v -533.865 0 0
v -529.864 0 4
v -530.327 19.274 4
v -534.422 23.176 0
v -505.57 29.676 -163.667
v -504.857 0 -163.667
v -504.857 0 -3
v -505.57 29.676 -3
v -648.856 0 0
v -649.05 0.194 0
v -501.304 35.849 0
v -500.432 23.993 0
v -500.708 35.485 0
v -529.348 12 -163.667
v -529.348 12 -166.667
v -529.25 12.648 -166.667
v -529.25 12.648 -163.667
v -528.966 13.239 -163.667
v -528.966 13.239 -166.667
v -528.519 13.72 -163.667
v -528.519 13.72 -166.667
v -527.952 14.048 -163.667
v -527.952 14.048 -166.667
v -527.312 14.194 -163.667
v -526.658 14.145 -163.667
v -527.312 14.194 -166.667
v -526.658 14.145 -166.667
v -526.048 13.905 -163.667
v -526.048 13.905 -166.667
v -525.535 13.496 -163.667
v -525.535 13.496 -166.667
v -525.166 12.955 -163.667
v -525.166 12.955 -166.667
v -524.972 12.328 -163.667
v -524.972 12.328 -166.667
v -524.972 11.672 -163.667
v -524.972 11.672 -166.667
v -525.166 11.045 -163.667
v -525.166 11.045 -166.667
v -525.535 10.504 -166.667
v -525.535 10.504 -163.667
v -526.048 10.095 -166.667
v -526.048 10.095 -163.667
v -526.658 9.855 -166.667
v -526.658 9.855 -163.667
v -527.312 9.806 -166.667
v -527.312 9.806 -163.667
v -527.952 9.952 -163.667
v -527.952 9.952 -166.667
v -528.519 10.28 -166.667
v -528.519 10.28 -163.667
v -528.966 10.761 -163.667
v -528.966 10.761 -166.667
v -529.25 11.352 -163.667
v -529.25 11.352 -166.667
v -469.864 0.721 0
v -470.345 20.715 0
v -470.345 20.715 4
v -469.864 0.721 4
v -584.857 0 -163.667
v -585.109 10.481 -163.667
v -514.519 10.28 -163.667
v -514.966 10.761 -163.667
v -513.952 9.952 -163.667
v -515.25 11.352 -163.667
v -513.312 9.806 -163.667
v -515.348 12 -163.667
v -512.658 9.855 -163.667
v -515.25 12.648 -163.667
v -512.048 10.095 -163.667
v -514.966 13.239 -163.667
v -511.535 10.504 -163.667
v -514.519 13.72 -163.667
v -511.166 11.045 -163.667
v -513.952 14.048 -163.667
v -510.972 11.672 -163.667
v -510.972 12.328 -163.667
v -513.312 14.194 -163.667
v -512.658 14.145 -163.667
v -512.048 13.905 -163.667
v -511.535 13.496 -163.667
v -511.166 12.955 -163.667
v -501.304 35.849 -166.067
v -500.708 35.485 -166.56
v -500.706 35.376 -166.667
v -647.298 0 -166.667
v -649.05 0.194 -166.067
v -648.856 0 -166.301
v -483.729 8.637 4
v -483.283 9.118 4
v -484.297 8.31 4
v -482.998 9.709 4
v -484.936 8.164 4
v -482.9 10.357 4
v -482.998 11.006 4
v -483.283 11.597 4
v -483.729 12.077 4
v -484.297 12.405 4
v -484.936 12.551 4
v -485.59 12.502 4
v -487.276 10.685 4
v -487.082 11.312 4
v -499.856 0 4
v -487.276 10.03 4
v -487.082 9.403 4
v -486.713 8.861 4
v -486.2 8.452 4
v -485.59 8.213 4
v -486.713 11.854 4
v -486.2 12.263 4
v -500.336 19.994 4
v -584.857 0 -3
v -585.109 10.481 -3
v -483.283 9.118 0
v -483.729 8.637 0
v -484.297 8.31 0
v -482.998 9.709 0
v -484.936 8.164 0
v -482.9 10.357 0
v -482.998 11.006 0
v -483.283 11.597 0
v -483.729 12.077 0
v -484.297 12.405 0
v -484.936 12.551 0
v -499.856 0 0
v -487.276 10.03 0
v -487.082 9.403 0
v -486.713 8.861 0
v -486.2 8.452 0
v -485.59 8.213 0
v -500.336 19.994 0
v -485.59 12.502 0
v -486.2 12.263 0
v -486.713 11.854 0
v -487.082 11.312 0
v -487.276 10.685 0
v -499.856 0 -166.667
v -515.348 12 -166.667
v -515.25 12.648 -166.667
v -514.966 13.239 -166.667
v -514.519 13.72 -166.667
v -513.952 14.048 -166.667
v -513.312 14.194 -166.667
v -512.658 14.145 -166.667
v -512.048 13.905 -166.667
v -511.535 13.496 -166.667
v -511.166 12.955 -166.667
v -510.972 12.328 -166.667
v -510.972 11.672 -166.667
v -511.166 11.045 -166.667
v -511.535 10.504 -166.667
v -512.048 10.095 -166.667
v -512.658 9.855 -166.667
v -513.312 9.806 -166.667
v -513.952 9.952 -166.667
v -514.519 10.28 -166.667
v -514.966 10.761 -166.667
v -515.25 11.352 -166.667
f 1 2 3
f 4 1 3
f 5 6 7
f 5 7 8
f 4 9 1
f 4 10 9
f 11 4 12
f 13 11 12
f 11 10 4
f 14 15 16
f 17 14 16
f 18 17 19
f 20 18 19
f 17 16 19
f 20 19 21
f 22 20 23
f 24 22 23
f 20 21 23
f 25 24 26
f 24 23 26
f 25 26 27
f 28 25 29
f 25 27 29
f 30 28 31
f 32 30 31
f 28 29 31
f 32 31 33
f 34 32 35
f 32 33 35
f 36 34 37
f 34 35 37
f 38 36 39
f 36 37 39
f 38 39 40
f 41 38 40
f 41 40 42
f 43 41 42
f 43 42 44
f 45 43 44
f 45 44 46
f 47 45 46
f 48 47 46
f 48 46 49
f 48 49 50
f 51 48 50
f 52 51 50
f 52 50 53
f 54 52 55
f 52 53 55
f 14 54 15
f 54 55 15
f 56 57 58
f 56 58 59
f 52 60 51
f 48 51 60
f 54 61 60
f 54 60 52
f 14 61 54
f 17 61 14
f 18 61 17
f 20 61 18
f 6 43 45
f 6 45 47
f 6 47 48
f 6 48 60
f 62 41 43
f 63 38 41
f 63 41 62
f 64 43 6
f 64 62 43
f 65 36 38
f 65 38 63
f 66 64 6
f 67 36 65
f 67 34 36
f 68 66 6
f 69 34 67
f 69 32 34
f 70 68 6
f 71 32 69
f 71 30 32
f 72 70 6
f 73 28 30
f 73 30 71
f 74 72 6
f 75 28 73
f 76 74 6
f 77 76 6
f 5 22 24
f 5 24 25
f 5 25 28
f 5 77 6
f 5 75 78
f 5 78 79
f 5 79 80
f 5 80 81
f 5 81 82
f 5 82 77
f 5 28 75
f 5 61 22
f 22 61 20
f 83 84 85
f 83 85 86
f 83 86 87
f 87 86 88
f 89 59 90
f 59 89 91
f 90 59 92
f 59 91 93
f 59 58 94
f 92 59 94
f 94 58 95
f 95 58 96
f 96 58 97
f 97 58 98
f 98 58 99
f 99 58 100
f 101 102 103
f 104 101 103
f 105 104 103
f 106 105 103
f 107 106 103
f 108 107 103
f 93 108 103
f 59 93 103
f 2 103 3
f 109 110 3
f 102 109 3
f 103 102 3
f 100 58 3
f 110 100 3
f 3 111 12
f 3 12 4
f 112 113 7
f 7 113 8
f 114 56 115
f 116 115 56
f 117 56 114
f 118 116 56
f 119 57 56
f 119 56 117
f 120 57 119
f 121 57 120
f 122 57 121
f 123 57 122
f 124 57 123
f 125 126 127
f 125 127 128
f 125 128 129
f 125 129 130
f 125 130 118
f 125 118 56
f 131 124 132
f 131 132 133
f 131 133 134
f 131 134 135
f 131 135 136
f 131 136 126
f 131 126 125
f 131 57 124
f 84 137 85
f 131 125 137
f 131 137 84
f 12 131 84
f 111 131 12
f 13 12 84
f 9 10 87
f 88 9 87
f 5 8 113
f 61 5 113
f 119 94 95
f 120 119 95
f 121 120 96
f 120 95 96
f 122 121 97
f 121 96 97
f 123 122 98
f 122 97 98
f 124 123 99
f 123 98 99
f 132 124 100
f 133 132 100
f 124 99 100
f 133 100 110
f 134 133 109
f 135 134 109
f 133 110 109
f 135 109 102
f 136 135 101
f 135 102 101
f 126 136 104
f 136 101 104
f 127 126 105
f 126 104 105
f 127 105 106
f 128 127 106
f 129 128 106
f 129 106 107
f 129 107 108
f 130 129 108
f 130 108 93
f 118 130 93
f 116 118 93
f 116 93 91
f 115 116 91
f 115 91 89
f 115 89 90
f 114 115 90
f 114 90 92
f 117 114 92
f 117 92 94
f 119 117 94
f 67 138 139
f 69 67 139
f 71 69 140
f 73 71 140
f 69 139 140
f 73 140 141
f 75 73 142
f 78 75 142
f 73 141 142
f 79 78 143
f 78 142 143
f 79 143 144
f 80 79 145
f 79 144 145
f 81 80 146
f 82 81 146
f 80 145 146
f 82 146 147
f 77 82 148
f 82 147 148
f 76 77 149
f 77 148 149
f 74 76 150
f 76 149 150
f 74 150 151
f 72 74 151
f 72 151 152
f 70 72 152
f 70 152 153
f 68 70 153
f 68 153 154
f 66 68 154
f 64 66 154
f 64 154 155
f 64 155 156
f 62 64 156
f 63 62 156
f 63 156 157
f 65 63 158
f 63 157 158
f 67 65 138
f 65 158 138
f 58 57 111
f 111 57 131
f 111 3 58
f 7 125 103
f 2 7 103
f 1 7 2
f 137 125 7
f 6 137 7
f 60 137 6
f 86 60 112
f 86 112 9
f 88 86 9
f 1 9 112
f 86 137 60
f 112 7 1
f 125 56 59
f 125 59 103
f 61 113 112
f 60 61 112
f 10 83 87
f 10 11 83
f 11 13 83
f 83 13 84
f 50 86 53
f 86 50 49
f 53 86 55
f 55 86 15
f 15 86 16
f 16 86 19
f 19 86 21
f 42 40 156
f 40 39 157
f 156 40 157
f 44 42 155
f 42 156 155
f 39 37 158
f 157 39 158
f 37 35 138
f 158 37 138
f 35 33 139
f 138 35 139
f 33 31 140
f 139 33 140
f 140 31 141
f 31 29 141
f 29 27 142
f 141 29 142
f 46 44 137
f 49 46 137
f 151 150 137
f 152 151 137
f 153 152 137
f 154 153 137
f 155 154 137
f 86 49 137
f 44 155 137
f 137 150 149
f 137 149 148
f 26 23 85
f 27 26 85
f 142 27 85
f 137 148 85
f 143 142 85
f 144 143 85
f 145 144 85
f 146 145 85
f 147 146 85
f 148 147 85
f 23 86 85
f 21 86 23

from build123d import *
from OCP.BRepFilletAPI import BRepFilletAPI_MakeChamfer

# Parameters (mm, degrees)
BOSS_EXTRUDE1_DEPTH = 166.66666666666666
CUT_EXTRUDE1_DEPTH  = 160.666666667
BOSS_EXTRUDE2_DEPTH = 4
SKETCH9_R           = 2.1999999999999833
CUT_EXTRUDE3_DEPTH  = 673.8557295952264
SKETCH10_R          = 2.1999999999999833
CUT_EXTRUDE4_DEPTH  = 3
CHAMFER3_SIZE       = 0.6
CHAMFER3_SIZE2      = 0.5047874406768073
CHAMFER4_SIZE       = 1
CHAMFER4_SIZE2      = 0.8287182147663876
CHAMFER8_SIZE       = 4
CHAMFER9_SIZE       = 4


with BuildPart() as part:
    # Sketch4 → Boss-Extrude1 (new body)
    with BuildSketch(Plane.XY):
        Polygon((-500.7204776760873, 35.989612544106855), (-649.8557297792629, -1.837e-14), (-499.8557297792629, -6.121e-14), align=None)
    extrude(amount=-BOSS_EXTRUDE1_DEPTH)

    # Sketch6 → Cut-Extrude1 (cut)
    with BuildSketch(Plane.XY.offset(-3)):
        Polygon((-504.85717289786834, -1.837e-14), (-505.570212772658, 29.675734299461347), (-585.1090138943516, 10.481274275937695), (-584.8571728978683, -1.837e-14), align=None)
    extrude(amount=-CUT_EXTRUDE1_DEPTH, mode=Mode.SUBTRACT)

    # Sketch8 → Boss-Extrude2 (add)
    with BuildSketch(Plane.XY):
        Polygon((-500.3361452774986, 19.994229191170454), (-470.34480149074295, 20.714852438524037), (-469.86438599250715, 0.720623247353527), (-499.8557297792629, -6.121e-14), (-529.8643884908956, -2.204e-14), (-530.3274890642546, 19.273605943816776), align=None)
    extrude(amount=BOSS_EXTRUDE2_DEPTH)

    # Sketch9 → Cut-Extrude3 (cut, through all)
    with BuildSketch(Plane.XY.offset(4)):
        with Locations((-485.1002656350029, 10.357426219261987)):
            Circle(SKETCH9_R)
    extrude(amount=-CUT_EXTRUDE3_DEPTH, mode=Mode.SUBTRACT)

    # Sketch10 → Cut-Extrude4 (cut)
    with BuildSketch(Plane(origin=(0, 0, -166.66666666666666), x_dir=(-1, 0, 0), z_dir=(0, 0, -1))):
        with Locations((513.1478143821638, 11.99999999999998)):
            Circle(SKETCH10_R)
        with Locations((527.1478143821638, 11.99999999999998)):
            Circle(SKETCH10_R)
    extrude(amount=-CUT_EXTRUDE4_DEPTH, mode=Mode.SUBTRACT)

    # Chamfer3: one chamfer whose edges measure the first distance from different faces: ONE call of the kernel's chamfer builder (chamfer() names one face for all edges)
    chamfer3_edges_1 = [part.edges().sort_by_distance(p)[0] for p in [
        (-500.7204776760873, 35.989612544106855, -83.33333333333333),
    ]]
    chamfer3_side_1 = [part.faces().sort_by_distance(p)[0] for p in [
        (-575.2881037276751, 17.994806272053417, -83.33333333333333),
    ]]
    chamfer3_edges_2 = [part.edges().sort_by_distance(p)[0] for p in [
        (-575.2881037276751, 17.994806272053417, -166.66666666666666),
    ]]
    chamfer3 = BRepFilletAPI_MakeChamfer(part.part.solid().wrapped)
    for e in chamfer3_edges_1:
        chamfer3.Add(CHAMFER3_SIZE, CHAMFER3_SIZE2, e.wrapped, chamfer3_side_1[0].wrapped)  # the first distance lies on this face
    for e in chamfer3_edges_2:
        chamfer3.Add(CHAMFER3_SIZE, e.wrapped)
    add(Compound.cast(chamfer3.Shape()), mode=Mode.REPLACE)

    # Chamfer4
    chamfer4_edges = [part.edges().sort_by_distance(p)[0] for p in [
        (-649.8557297792629, -1.837e-14, -83.03333333333336),
    ]]
    chamfer4_side = [part.faces().sort_by_distance(p)[0] for p in [
        (-605.6991208479849, -3.098e-14, -82.49305945140193),
    ]]
    chamfer(chamfer4_edges, length=CHAMFER4_SIZE, length2=CHAMFER4_SIZE2, reference=chamfer4_side[0])

    # Chamfer8
    chamfer8_edges = [part.edges().sort_by_distance(p)[0] for p in [
        (-515.3318171708765, 19.633917567493594, 0),
    ]]
    chamfer(chamfer8_edges, length=CHAMFER8_SIZE - 0.0001)  # a hair under: the kernel refuses the full size

    # Chamfer9
    chamfer9_edges = [part.edges().sort_by_distance(p)[0] for p in [
        (-530.1439791263599, 11.636175905452475, 0),
    ]]
    chamfer(chamfer9_edges, length=CHAMFER9_SIZE - 0.0001)  # a hair under: the kernel refuses the full size


solid = part.part
